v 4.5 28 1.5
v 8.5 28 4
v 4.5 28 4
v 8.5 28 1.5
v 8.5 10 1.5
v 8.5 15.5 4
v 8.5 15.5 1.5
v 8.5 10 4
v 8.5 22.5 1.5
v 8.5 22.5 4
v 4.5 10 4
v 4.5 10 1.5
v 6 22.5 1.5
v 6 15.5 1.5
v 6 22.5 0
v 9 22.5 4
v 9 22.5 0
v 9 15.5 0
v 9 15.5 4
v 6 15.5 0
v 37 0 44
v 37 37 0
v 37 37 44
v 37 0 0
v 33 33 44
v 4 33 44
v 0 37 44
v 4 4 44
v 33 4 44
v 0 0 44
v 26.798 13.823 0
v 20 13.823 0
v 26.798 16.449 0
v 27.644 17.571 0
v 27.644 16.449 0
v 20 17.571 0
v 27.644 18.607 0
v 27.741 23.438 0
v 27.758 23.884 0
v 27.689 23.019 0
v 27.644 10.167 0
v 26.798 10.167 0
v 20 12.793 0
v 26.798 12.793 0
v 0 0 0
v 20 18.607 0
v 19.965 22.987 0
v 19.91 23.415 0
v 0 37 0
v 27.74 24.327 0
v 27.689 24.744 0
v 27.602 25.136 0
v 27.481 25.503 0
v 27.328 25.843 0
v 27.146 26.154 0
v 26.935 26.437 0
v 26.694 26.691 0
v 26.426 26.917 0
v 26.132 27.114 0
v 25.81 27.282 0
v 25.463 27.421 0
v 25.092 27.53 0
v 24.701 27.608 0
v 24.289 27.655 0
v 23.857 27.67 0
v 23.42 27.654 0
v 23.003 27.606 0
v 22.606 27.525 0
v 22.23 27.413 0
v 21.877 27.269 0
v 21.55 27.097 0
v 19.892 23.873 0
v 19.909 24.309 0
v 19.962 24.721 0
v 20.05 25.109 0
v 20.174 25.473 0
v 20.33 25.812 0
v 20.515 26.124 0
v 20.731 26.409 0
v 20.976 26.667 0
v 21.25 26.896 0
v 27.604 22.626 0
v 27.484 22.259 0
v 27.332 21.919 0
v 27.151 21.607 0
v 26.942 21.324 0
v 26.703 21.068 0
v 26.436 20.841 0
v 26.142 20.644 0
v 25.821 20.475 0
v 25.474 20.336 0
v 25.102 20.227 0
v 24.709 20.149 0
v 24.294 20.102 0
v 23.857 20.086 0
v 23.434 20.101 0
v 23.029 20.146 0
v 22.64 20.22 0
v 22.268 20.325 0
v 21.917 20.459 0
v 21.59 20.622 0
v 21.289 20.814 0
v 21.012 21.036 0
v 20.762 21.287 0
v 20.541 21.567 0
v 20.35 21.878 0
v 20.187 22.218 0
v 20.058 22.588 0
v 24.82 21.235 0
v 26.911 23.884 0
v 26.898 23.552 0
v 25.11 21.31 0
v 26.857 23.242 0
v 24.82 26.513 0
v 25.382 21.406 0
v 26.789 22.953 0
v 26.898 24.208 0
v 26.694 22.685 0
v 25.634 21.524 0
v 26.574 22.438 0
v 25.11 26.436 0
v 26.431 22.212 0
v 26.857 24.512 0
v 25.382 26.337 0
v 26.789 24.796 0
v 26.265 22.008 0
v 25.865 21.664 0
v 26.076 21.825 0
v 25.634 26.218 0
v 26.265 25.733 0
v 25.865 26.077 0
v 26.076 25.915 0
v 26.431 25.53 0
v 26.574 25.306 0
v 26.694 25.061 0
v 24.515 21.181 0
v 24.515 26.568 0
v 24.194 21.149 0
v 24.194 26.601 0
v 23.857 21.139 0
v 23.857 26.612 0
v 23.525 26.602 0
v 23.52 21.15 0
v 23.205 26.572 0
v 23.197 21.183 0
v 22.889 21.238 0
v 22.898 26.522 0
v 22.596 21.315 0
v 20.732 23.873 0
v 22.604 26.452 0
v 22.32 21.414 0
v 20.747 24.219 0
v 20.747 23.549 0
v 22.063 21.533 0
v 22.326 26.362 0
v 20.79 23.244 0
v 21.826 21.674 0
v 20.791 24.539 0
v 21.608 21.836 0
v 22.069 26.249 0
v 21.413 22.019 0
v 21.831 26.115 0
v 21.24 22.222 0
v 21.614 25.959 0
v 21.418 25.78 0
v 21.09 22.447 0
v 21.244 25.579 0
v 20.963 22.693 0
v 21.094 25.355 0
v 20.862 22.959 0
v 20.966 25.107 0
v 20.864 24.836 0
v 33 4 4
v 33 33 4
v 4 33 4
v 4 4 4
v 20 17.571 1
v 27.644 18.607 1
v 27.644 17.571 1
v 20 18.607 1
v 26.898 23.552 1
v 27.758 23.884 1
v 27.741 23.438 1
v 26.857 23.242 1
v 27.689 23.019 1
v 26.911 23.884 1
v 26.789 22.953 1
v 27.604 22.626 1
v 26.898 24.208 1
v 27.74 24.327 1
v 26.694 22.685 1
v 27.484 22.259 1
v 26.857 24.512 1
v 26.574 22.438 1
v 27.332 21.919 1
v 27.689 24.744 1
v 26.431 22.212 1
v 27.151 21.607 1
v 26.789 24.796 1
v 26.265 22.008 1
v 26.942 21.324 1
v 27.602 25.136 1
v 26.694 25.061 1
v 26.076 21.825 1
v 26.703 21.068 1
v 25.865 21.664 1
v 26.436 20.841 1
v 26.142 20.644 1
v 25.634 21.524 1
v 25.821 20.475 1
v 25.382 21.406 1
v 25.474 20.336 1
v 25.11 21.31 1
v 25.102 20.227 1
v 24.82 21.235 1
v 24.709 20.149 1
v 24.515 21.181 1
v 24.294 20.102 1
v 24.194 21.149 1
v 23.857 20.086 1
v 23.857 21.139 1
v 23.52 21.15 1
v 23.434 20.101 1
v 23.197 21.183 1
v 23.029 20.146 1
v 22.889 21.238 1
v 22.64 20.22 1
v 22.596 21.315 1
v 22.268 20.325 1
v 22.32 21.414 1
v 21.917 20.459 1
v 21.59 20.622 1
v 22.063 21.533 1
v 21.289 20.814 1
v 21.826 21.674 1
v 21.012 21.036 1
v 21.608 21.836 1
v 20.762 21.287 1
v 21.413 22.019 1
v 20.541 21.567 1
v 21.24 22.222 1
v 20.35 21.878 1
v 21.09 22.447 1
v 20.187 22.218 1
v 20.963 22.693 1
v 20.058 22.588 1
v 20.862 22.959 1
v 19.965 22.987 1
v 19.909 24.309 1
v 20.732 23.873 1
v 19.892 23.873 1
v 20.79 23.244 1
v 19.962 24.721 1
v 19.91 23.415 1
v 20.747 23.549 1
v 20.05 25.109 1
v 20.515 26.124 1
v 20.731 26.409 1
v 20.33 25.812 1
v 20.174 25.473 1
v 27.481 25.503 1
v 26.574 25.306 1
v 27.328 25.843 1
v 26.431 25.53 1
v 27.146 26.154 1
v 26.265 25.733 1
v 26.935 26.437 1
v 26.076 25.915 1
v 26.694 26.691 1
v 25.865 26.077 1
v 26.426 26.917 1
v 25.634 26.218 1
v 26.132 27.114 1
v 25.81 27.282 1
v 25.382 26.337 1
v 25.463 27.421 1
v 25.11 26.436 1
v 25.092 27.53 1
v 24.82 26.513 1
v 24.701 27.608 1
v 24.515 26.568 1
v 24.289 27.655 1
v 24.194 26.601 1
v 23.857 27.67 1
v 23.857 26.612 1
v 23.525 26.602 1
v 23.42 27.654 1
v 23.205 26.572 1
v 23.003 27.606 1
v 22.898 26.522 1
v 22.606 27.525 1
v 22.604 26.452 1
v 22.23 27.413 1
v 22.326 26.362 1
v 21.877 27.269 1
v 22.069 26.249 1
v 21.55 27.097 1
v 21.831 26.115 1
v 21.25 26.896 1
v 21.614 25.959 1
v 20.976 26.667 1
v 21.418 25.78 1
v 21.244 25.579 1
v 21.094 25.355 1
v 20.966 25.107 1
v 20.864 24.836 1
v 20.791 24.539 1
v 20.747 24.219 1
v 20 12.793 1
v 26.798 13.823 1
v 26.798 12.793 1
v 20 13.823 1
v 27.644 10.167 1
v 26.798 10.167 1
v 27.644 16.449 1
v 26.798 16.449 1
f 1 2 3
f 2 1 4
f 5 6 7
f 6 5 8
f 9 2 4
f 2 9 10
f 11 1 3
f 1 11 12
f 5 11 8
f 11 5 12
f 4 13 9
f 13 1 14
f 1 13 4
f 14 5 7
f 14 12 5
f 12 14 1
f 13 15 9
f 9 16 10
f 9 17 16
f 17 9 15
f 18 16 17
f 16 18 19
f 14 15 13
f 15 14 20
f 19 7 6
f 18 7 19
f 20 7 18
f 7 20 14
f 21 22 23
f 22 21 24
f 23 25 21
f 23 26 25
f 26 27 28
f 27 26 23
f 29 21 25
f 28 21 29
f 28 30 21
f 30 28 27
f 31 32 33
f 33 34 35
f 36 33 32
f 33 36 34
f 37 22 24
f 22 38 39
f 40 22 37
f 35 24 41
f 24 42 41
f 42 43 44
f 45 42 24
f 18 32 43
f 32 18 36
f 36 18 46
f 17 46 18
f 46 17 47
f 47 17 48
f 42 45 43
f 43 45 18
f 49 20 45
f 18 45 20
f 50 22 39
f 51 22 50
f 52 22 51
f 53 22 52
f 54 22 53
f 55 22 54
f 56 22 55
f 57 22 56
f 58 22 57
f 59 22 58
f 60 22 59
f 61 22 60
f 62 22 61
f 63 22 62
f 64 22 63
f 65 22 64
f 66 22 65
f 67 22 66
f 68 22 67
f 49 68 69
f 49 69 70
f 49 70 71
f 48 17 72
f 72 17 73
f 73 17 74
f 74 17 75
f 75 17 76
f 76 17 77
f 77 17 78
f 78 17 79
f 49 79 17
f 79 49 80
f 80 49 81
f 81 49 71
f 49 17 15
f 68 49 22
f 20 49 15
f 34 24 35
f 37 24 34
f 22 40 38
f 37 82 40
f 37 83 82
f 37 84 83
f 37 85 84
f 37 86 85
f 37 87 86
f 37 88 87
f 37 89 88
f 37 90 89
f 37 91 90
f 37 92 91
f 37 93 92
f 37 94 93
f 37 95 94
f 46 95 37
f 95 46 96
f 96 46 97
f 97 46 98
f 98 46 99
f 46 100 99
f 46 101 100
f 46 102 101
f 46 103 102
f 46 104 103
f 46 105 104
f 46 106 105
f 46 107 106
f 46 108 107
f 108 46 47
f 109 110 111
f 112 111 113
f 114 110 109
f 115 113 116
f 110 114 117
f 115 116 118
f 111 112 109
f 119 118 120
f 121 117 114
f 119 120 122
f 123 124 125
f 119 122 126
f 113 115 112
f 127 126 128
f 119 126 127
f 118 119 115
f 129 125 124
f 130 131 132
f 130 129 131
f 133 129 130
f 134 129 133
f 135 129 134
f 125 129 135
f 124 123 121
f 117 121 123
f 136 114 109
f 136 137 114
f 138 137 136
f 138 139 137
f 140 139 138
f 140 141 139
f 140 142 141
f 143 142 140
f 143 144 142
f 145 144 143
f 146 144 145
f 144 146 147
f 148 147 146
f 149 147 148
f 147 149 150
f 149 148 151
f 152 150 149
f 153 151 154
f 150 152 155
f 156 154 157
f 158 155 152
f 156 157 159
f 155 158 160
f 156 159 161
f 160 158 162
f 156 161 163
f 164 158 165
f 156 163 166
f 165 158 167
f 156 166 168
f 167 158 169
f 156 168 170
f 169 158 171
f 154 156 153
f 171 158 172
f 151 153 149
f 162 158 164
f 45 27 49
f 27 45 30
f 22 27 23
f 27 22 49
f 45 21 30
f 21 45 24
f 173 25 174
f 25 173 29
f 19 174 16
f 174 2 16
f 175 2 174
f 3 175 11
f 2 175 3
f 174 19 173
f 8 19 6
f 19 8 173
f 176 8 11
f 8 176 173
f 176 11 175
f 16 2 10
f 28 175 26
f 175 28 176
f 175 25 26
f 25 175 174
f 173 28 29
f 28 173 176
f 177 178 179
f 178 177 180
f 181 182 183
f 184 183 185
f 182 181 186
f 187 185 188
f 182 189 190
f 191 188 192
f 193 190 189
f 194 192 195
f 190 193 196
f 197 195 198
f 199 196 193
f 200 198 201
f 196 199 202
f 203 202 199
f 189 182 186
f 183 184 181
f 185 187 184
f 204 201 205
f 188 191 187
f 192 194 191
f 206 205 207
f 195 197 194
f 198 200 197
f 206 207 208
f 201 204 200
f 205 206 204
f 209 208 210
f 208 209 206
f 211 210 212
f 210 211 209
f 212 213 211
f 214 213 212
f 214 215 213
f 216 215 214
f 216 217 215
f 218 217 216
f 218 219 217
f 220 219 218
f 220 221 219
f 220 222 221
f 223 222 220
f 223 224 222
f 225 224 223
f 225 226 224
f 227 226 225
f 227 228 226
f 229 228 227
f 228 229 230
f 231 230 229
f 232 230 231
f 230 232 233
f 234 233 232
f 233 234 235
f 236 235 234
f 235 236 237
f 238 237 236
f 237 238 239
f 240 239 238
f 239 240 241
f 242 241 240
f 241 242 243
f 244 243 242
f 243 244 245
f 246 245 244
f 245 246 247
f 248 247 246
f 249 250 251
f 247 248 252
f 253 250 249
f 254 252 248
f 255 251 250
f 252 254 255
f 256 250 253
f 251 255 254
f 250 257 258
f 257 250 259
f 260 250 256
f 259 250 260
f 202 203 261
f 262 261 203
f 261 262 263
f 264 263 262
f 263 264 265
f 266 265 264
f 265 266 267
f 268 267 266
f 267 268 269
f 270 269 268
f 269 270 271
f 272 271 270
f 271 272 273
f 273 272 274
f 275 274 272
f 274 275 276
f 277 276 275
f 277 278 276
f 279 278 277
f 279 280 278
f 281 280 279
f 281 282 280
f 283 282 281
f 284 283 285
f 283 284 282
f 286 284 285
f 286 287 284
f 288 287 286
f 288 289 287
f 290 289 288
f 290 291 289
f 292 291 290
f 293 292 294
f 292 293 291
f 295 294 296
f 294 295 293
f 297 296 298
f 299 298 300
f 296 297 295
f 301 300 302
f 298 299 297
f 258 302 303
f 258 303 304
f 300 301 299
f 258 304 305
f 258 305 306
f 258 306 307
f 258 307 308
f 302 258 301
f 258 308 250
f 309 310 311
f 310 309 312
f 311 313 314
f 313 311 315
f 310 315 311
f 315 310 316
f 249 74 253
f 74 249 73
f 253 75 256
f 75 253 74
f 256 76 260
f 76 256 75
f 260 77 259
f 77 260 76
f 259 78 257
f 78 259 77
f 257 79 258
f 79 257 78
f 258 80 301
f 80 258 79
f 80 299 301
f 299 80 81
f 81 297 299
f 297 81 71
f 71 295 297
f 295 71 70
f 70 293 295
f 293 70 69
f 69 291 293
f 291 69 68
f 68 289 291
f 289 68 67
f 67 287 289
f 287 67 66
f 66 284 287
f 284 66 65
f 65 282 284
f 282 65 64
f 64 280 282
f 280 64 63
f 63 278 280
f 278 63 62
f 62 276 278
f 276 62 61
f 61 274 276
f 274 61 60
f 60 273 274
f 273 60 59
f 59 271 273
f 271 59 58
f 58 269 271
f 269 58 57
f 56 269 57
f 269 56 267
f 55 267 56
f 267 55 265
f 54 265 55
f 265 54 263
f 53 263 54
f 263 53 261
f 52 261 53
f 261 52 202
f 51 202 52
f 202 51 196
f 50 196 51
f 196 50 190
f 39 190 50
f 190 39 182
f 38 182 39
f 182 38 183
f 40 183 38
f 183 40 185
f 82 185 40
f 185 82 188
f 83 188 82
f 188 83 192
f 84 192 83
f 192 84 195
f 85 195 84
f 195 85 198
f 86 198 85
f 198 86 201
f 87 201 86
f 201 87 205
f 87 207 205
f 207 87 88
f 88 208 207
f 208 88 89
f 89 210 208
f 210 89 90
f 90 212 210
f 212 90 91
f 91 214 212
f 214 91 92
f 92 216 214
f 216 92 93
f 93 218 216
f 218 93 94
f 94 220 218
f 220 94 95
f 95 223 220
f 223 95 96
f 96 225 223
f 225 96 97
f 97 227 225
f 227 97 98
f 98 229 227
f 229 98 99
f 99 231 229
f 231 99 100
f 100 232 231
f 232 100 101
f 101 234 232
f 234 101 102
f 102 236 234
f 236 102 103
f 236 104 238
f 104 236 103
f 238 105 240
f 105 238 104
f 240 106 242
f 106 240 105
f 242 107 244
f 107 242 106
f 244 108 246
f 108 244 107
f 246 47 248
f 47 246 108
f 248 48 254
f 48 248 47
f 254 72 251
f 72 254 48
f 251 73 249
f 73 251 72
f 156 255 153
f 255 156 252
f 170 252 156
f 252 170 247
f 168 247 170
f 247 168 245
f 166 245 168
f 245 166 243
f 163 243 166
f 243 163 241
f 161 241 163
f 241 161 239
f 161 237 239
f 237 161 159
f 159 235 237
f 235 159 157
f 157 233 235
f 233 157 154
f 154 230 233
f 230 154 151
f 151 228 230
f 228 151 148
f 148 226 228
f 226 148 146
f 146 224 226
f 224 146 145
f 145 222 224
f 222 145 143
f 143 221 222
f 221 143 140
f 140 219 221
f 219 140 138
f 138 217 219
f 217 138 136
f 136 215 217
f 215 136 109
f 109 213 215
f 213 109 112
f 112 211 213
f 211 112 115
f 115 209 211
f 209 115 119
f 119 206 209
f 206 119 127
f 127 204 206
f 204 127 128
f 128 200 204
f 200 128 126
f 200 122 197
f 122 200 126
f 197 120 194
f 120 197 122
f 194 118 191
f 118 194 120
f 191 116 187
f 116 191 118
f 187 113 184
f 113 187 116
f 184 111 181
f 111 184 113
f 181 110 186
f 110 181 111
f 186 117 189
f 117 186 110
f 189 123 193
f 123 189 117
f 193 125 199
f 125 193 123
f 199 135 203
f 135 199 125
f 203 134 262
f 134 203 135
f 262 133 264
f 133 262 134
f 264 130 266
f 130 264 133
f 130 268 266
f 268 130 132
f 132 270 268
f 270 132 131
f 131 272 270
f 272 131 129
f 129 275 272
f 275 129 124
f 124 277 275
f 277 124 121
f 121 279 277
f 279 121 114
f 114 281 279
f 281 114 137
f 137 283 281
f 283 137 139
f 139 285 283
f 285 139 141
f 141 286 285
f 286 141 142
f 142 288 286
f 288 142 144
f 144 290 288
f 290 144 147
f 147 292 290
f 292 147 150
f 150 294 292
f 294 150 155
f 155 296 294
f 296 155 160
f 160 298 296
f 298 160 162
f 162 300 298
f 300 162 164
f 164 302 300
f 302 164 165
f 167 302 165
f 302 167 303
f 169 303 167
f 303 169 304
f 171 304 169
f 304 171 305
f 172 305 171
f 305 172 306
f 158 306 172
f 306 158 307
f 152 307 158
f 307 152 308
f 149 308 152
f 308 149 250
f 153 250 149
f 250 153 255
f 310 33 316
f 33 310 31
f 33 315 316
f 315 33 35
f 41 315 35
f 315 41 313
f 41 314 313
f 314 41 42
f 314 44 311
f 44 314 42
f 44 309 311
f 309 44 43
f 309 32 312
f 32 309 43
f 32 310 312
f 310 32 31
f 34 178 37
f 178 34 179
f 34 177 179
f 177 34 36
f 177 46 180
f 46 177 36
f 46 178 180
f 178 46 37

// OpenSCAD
// https://openscad.org/
module screen(){
    union() {
        cube([28,28,6]);
        translate([9,0,6]) cube([10,2,6]);
    }
    
}
module arduino_pro(){
    union() {
        cube([18,33,4]);
        translate([5.5,-2,1.5]) cube([7,6,3]);
    }
}
//screen();
//translate([30,0,0]) arduino_pro();

module screen_and_arduino(){
    translate([5.5,0,0]){
        translate([28-5.5,42,28]) rotate([90,180,0]) screen();
        arduino_pro();
    }
}
module case(){
    difference(){
        translate([0,2,0])
        difference() {
            cube([34,42,34]);
            translate([3,3,3]) cube([29,28,29]);
        }
        translate([3,3,3]) !screen_and_arduino();
    }
}
module cased(){
    difference(){
        cube([37,37,44]);
        translate([4,4,4]) cube([29,29,42]);
        #translate([4.5,4.5,1.5]) rotate([90,0,90]) screen_and_arduino();
        translate([20,28,1]) rotate([180, 0, 90])
            linear_extrude(1)
                text("TIO", halign="right", size=8);
    }
}
cased();
